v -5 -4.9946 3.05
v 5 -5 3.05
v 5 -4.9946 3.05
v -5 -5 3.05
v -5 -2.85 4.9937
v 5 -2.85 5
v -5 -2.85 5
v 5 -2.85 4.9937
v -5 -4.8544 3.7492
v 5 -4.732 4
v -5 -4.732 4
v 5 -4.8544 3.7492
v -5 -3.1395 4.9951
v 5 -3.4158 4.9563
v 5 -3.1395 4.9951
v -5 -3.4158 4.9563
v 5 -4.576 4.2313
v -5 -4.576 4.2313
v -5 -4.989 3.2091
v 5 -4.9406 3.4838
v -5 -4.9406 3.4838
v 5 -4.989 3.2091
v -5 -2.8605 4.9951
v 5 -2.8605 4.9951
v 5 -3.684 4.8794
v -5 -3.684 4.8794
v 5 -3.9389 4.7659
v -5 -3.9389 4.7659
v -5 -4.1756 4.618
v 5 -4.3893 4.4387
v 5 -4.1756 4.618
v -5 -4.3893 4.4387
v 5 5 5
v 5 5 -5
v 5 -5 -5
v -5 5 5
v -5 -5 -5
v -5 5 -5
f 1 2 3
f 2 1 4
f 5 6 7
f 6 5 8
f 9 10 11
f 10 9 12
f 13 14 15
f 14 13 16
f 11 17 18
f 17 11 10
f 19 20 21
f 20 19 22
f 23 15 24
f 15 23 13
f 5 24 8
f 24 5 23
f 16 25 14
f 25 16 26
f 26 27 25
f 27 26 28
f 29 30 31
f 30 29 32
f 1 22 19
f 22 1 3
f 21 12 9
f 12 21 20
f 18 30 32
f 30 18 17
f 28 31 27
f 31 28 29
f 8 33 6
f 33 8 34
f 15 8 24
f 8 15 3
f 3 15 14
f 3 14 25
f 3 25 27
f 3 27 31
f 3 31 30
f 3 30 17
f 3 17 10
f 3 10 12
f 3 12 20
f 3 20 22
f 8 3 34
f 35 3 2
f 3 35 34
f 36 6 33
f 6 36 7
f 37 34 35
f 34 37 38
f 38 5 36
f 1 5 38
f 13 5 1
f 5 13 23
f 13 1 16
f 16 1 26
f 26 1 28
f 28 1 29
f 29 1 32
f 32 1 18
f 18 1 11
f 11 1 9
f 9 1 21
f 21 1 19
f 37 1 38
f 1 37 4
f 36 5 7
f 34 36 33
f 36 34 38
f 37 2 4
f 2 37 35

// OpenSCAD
pad = 0.1;	// Padding to maintain manifold
box_l = 10;	// Length
box_w = 10;	// Width
box_h = 10;	// Height
round_r = 2;	// Radius of round
smooth = 45;	// Number of facets of rounding cylinder

difference() {
	cube([box_l, box_w, box_h], center = true);
	translate([0, -box_w/2+round_r, box_h/2-round_r]) {
		difference() {
			translate([0,-round_r+pad,round_r+pad])
				cube([box_l+2*pad, round_r*2+pad, round_r*2+pad], center = true);
			rotate(a=[0,90,0])
				cylinder(box_l+4*pad,round_r,round_r,center=true,$fn=smooth);
		}
	}
}
